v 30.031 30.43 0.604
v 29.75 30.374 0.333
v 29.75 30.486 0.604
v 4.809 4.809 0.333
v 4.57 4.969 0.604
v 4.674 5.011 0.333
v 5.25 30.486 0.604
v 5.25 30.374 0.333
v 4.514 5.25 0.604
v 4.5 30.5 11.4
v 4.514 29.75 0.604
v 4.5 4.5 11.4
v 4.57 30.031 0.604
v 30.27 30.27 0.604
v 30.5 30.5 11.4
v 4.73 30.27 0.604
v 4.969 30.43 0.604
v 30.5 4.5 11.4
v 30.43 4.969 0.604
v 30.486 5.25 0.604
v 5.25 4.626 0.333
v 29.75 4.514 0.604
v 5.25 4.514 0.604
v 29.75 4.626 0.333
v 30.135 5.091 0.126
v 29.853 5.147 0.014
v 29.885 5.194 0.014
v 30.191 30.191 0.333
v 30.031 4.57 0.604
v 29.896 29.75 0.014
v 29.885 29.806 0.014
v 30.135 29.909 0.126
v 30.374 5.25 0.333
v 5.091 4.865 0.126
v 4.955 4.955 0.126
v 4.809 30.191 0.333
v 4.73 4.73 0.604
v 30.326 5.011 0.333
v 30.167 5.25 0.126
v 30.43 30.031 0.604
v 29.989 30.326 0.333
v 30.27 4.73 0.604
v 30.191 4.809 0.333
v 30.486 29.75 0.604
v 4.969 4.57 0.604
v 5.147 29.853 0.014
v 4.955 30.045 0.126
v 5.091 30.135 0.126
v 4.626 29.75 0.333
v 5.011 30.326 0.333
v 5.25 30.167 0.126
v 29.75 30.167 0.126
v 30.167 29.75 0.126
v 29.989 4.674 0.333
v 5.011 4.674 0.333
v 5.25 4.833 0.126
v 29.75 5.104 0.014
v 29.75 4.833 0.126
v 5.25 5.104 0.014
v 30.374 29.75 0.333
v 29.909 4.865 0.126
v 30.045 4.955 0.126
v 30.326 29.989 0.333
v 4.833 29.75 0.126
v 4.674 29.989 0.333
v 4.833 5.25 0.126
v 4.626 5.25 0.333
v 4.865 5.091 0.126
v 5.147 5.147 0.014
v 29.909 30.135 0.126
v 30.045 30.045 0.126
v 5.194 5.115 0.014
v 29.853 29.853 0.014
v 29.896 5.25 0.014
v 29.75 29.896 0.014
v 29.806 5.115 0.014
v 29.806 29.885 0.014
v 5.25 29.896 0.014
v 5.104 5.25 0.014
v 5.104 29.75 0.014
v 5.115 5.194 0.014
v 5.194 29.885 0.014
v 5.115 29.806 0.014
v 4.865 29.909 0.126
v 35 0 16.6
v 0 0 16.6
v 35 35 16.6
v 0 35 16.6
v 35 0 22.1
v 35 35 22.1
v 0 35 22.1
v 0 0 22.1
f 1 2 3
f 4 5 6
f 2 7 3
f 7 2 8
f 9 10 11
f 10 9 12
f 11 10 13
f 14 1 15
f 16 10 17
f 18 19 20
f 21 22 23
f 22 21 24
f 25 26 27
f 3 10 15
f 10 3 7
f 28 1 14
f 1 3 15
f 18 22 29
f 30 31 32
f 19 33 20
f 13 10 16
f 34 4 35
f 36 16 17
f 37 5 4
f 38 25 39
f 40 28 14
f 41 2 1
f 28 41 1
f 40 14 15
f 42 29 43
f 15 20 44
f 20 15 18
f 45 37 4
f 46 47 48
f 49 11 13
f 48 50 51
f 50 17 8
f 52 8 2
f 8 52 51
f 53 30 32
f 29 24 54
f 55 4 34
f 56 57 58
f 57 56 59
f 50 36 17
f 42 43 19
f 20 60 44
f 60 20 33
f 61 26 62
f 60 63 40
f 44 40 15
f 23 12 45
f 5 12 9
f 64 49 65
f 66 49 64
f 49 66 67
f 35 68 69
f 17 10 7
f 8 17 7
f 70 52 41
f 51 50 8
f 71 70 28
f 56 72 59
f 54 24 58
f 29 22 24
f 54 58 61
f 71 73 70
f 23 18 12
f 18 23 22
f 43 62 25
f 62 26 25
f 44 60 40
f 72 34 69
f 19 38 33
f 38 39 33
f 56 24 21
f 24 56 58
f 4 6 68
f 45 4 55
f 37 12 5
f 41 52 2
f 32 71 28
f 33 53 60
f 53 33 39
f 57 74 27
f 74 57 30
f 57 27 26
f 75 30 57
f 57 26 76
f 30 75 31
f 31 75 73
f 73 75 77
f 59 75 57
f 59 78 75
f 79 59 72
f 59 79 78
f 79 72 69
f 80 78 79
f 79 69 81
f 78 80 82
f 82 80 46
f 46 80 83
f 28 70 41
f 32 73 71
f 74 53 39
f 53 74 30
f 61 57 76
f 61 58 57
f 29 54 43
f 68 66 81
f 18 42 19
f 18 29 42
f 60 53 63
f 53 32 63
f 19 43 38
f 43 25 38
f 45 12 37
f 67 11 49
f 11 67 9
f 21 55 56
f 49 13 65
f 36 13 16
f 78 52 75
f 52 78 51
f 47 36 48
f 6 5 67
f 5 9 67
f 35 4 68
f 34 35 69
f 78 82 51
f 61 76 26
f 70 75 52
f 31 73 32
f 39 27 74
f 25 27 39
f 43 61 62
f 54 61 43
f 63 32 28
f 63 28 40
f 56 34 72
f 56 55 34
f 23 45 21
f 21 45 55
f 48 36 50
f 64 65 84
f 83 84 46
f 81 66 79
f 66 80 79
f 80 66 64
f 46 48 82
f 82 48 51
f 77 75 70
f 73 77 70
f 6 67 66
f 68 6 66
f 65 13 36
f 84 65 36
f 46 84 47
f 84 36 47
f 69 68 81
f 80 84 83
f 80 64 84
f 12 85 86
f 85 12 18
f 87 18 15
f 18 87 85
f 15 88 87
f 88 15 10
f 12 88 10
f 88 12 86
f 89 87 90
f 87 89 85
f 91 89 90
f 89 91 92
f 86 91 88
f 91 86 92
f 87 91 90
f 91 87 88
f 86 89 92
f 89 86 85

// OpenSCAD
// DungeonBlocks - Blank Floor Tile

/* [Tile] */
cols = 1;  // number of tile columns
rows = 1;  // number of tile rows

/* [Wall] */
wall_n         = false;
wall_e         = false;
wall_w         = false;
wall_s         = false;
wall_height    = 33.0;  // height from slab base — top is fixed regardless of floor height
wall_thickness =  7.0;  // wall depth in mm

/* [Floor] */
floor_preset   = 9.5; // [0:Custom, 3:Water (3mm), 6:Ground (6mm), 9.5:Manmade (9.5mm)]
floor_custom   = 9.5; // custom height in mm — only used when preset is Custom
floor_texture  = true;
texture_depth  = 4.0; // how deep the texture is embossed in mm
texture_zoom   = 1.0; // 1 = full image, 2 = use 1/4 of image at 2x scale

/* [Socket] */
peg_height = 11.4; // [11.4:Normal, 5.7:Short]


/* [Hidden] */

tile_size        = 35.0;
peg_size         = 26.0;
corner_bevel     =  0.75;
round_corners    = true;
peg_flare_height = 5.2;
corner_fn        = 16;

floor_height = (floor_preset == 0) ? floor_custom : floor_preset;

peg_top_z = peg_height;
base_z    = peg_height + peg_flare_height;

total_w = cols * tile_size;
total_d = rows * tile_size;


// --- Helpers ---

module _corner_discs(size_xy, z, r) {
    inset = (tile_size - size_xy) / 2;
    rr    = min(r, size_xy / 2 - 0.01);
    for (x = [inset + rr, inset + size_xy - rr])
    for (y = [inset + rr, inset + size_xy - rr])
        translate([x, y, z])
            cylinder(r=rr, h=0.001, $fn=corner_fn);
}

module centered_square_prism(size_xy, z0, height, r=0, round_bottom=false) {
    inset = (tile_size - size_xy) / 2;
    if (r <= 0) {
        translate([inset, inset, z0])
            cube([size_xy, size_xy, height], center=false);
    } else {
        rr = min(r, size_xy / 2 - 0.01);
        if (round_bottom) {
            hull() {
                for (x = [inset + rr, inset + size_xy - rr])
                for (y = [inset + rr, inset + size_xy - rr])
                    translate([x, y, z0 + rr])
                        sphere(r=rr, $fn=corner_fn);
                translate([inset, inset, z0 + height])
                    cube([size_xy, size_xy, 0.001]);
            }
        } else {
            hull() {
                for (x = [inset + rr, inset + size_xy - rr])
                for (y = [inset + rr, inset + size_xy - rr])
                    translate([x, y, z0])
                        cylinder(r=rr, h=0.001, $fn=corner_fn);
                translate([inset, inset, z0 + height])
                    cube([size_xy, size_xy, 0.001]);
            }
        }
    }
}

module square_frustum(bottom_size, top_size, z0, height, r=0) {
    if (r <= 0) {
        bi = (tile_size - bottom_size) / 2;
        ti = (tile_size - top_size) / 2;
        polyhedron(
            points = [
                [bi,             bi,             z0],
                [tile_size - bi, bi,             z0],
                [tile_size - bi, tile_size - bi, z0],
                [bi,             tile_size - bi, z0],
                [ti,             ti,             z0 + height],
                [tile_size - ti, ti,             z0 + height],
                [tile_size - ti, tile_size - ti, z0 + height],
                [ti,             tile_size - ti, z0 + height]
            ],
            faces = [
                [0, 3, 2, 1],
                [4, 5, 6, 7],
                [0, 1, 5, 4],
                [1, 2, 6, 5],
                [2, 3, 7, 6],
                [3, 0, 4, 7]
            ]
        );
    } else {
        hull() {
            _corner_discs(bottom_size, z0,          r);
            _corner_discs(top_size,    z0 + height, r);
        }
    }
}


// --- Components ---

module socket_base() {
    r           = round_corners ? corner_bevel : 0;
    bevel_entry = !round_corners && corner_bevel > 0;
    col_z0      = bevel_entry ? corner_bevel : 0;
    col_height  = peg_top_z - col_z0;

    if (bevel_entry)
        square_frustum(peg_size - 2 * corner_bevel, peg_size, 0, corner_bevel);

    centered_square_prism(peg_size, col_z0, col_height, r, round_corners);

    square_frustum(peg_size, tile_size, peg_top_z, peg_flare_height);
}

texture_file = "../textures/grass-foliage-256-faded.png";

module floor_tile() {
    translate([0, 0, base_z]) {
        if (floor_texture) {
            cube([total_w, total_d, floor_height - texture_depth]);
            translate([0, 0, floor_height - texture_depth])
                if (texture_zoom == 1) {
                    resize([total_w, total_d, texture_depth])
                        surface(file=texture_file, invert=false);
                } else {
                    intersection() {
                        cube([total_w, total_d, texture_depth]);
                        resize([total_w * texture_zoom, total_d * texture_zoom, texture_depth])
                            surface(file=texture_file, invert=false);
                    }
                }
        } else {
            cube([total_w, total_d, floor_height]);
        }
    }
}

// --- Model ---

union() {
    for (c = [0:cols-1], r = [0:rows-1])
        translate([c * tile_size, r * tile_size, 0])
            socket_base();
    floor_tile();
    if (wall_w) translate([0,                        0, base_z]) cube([wall_thickness, total_d, wall_height]);
    if (wall_e) translate([total_w - wall_thickness, 0, base_z]) cube([wall_thickness, total_d, wall_height]);
    if (wall_s) translate([0,                        0, base_z]) cube([total_w, wall_thickness, wall_height]);
    if (wall_n) translate([0, total_d - wall_thickness, base_z]) cube([total_w, wall_thickness, wall_height]);
}
